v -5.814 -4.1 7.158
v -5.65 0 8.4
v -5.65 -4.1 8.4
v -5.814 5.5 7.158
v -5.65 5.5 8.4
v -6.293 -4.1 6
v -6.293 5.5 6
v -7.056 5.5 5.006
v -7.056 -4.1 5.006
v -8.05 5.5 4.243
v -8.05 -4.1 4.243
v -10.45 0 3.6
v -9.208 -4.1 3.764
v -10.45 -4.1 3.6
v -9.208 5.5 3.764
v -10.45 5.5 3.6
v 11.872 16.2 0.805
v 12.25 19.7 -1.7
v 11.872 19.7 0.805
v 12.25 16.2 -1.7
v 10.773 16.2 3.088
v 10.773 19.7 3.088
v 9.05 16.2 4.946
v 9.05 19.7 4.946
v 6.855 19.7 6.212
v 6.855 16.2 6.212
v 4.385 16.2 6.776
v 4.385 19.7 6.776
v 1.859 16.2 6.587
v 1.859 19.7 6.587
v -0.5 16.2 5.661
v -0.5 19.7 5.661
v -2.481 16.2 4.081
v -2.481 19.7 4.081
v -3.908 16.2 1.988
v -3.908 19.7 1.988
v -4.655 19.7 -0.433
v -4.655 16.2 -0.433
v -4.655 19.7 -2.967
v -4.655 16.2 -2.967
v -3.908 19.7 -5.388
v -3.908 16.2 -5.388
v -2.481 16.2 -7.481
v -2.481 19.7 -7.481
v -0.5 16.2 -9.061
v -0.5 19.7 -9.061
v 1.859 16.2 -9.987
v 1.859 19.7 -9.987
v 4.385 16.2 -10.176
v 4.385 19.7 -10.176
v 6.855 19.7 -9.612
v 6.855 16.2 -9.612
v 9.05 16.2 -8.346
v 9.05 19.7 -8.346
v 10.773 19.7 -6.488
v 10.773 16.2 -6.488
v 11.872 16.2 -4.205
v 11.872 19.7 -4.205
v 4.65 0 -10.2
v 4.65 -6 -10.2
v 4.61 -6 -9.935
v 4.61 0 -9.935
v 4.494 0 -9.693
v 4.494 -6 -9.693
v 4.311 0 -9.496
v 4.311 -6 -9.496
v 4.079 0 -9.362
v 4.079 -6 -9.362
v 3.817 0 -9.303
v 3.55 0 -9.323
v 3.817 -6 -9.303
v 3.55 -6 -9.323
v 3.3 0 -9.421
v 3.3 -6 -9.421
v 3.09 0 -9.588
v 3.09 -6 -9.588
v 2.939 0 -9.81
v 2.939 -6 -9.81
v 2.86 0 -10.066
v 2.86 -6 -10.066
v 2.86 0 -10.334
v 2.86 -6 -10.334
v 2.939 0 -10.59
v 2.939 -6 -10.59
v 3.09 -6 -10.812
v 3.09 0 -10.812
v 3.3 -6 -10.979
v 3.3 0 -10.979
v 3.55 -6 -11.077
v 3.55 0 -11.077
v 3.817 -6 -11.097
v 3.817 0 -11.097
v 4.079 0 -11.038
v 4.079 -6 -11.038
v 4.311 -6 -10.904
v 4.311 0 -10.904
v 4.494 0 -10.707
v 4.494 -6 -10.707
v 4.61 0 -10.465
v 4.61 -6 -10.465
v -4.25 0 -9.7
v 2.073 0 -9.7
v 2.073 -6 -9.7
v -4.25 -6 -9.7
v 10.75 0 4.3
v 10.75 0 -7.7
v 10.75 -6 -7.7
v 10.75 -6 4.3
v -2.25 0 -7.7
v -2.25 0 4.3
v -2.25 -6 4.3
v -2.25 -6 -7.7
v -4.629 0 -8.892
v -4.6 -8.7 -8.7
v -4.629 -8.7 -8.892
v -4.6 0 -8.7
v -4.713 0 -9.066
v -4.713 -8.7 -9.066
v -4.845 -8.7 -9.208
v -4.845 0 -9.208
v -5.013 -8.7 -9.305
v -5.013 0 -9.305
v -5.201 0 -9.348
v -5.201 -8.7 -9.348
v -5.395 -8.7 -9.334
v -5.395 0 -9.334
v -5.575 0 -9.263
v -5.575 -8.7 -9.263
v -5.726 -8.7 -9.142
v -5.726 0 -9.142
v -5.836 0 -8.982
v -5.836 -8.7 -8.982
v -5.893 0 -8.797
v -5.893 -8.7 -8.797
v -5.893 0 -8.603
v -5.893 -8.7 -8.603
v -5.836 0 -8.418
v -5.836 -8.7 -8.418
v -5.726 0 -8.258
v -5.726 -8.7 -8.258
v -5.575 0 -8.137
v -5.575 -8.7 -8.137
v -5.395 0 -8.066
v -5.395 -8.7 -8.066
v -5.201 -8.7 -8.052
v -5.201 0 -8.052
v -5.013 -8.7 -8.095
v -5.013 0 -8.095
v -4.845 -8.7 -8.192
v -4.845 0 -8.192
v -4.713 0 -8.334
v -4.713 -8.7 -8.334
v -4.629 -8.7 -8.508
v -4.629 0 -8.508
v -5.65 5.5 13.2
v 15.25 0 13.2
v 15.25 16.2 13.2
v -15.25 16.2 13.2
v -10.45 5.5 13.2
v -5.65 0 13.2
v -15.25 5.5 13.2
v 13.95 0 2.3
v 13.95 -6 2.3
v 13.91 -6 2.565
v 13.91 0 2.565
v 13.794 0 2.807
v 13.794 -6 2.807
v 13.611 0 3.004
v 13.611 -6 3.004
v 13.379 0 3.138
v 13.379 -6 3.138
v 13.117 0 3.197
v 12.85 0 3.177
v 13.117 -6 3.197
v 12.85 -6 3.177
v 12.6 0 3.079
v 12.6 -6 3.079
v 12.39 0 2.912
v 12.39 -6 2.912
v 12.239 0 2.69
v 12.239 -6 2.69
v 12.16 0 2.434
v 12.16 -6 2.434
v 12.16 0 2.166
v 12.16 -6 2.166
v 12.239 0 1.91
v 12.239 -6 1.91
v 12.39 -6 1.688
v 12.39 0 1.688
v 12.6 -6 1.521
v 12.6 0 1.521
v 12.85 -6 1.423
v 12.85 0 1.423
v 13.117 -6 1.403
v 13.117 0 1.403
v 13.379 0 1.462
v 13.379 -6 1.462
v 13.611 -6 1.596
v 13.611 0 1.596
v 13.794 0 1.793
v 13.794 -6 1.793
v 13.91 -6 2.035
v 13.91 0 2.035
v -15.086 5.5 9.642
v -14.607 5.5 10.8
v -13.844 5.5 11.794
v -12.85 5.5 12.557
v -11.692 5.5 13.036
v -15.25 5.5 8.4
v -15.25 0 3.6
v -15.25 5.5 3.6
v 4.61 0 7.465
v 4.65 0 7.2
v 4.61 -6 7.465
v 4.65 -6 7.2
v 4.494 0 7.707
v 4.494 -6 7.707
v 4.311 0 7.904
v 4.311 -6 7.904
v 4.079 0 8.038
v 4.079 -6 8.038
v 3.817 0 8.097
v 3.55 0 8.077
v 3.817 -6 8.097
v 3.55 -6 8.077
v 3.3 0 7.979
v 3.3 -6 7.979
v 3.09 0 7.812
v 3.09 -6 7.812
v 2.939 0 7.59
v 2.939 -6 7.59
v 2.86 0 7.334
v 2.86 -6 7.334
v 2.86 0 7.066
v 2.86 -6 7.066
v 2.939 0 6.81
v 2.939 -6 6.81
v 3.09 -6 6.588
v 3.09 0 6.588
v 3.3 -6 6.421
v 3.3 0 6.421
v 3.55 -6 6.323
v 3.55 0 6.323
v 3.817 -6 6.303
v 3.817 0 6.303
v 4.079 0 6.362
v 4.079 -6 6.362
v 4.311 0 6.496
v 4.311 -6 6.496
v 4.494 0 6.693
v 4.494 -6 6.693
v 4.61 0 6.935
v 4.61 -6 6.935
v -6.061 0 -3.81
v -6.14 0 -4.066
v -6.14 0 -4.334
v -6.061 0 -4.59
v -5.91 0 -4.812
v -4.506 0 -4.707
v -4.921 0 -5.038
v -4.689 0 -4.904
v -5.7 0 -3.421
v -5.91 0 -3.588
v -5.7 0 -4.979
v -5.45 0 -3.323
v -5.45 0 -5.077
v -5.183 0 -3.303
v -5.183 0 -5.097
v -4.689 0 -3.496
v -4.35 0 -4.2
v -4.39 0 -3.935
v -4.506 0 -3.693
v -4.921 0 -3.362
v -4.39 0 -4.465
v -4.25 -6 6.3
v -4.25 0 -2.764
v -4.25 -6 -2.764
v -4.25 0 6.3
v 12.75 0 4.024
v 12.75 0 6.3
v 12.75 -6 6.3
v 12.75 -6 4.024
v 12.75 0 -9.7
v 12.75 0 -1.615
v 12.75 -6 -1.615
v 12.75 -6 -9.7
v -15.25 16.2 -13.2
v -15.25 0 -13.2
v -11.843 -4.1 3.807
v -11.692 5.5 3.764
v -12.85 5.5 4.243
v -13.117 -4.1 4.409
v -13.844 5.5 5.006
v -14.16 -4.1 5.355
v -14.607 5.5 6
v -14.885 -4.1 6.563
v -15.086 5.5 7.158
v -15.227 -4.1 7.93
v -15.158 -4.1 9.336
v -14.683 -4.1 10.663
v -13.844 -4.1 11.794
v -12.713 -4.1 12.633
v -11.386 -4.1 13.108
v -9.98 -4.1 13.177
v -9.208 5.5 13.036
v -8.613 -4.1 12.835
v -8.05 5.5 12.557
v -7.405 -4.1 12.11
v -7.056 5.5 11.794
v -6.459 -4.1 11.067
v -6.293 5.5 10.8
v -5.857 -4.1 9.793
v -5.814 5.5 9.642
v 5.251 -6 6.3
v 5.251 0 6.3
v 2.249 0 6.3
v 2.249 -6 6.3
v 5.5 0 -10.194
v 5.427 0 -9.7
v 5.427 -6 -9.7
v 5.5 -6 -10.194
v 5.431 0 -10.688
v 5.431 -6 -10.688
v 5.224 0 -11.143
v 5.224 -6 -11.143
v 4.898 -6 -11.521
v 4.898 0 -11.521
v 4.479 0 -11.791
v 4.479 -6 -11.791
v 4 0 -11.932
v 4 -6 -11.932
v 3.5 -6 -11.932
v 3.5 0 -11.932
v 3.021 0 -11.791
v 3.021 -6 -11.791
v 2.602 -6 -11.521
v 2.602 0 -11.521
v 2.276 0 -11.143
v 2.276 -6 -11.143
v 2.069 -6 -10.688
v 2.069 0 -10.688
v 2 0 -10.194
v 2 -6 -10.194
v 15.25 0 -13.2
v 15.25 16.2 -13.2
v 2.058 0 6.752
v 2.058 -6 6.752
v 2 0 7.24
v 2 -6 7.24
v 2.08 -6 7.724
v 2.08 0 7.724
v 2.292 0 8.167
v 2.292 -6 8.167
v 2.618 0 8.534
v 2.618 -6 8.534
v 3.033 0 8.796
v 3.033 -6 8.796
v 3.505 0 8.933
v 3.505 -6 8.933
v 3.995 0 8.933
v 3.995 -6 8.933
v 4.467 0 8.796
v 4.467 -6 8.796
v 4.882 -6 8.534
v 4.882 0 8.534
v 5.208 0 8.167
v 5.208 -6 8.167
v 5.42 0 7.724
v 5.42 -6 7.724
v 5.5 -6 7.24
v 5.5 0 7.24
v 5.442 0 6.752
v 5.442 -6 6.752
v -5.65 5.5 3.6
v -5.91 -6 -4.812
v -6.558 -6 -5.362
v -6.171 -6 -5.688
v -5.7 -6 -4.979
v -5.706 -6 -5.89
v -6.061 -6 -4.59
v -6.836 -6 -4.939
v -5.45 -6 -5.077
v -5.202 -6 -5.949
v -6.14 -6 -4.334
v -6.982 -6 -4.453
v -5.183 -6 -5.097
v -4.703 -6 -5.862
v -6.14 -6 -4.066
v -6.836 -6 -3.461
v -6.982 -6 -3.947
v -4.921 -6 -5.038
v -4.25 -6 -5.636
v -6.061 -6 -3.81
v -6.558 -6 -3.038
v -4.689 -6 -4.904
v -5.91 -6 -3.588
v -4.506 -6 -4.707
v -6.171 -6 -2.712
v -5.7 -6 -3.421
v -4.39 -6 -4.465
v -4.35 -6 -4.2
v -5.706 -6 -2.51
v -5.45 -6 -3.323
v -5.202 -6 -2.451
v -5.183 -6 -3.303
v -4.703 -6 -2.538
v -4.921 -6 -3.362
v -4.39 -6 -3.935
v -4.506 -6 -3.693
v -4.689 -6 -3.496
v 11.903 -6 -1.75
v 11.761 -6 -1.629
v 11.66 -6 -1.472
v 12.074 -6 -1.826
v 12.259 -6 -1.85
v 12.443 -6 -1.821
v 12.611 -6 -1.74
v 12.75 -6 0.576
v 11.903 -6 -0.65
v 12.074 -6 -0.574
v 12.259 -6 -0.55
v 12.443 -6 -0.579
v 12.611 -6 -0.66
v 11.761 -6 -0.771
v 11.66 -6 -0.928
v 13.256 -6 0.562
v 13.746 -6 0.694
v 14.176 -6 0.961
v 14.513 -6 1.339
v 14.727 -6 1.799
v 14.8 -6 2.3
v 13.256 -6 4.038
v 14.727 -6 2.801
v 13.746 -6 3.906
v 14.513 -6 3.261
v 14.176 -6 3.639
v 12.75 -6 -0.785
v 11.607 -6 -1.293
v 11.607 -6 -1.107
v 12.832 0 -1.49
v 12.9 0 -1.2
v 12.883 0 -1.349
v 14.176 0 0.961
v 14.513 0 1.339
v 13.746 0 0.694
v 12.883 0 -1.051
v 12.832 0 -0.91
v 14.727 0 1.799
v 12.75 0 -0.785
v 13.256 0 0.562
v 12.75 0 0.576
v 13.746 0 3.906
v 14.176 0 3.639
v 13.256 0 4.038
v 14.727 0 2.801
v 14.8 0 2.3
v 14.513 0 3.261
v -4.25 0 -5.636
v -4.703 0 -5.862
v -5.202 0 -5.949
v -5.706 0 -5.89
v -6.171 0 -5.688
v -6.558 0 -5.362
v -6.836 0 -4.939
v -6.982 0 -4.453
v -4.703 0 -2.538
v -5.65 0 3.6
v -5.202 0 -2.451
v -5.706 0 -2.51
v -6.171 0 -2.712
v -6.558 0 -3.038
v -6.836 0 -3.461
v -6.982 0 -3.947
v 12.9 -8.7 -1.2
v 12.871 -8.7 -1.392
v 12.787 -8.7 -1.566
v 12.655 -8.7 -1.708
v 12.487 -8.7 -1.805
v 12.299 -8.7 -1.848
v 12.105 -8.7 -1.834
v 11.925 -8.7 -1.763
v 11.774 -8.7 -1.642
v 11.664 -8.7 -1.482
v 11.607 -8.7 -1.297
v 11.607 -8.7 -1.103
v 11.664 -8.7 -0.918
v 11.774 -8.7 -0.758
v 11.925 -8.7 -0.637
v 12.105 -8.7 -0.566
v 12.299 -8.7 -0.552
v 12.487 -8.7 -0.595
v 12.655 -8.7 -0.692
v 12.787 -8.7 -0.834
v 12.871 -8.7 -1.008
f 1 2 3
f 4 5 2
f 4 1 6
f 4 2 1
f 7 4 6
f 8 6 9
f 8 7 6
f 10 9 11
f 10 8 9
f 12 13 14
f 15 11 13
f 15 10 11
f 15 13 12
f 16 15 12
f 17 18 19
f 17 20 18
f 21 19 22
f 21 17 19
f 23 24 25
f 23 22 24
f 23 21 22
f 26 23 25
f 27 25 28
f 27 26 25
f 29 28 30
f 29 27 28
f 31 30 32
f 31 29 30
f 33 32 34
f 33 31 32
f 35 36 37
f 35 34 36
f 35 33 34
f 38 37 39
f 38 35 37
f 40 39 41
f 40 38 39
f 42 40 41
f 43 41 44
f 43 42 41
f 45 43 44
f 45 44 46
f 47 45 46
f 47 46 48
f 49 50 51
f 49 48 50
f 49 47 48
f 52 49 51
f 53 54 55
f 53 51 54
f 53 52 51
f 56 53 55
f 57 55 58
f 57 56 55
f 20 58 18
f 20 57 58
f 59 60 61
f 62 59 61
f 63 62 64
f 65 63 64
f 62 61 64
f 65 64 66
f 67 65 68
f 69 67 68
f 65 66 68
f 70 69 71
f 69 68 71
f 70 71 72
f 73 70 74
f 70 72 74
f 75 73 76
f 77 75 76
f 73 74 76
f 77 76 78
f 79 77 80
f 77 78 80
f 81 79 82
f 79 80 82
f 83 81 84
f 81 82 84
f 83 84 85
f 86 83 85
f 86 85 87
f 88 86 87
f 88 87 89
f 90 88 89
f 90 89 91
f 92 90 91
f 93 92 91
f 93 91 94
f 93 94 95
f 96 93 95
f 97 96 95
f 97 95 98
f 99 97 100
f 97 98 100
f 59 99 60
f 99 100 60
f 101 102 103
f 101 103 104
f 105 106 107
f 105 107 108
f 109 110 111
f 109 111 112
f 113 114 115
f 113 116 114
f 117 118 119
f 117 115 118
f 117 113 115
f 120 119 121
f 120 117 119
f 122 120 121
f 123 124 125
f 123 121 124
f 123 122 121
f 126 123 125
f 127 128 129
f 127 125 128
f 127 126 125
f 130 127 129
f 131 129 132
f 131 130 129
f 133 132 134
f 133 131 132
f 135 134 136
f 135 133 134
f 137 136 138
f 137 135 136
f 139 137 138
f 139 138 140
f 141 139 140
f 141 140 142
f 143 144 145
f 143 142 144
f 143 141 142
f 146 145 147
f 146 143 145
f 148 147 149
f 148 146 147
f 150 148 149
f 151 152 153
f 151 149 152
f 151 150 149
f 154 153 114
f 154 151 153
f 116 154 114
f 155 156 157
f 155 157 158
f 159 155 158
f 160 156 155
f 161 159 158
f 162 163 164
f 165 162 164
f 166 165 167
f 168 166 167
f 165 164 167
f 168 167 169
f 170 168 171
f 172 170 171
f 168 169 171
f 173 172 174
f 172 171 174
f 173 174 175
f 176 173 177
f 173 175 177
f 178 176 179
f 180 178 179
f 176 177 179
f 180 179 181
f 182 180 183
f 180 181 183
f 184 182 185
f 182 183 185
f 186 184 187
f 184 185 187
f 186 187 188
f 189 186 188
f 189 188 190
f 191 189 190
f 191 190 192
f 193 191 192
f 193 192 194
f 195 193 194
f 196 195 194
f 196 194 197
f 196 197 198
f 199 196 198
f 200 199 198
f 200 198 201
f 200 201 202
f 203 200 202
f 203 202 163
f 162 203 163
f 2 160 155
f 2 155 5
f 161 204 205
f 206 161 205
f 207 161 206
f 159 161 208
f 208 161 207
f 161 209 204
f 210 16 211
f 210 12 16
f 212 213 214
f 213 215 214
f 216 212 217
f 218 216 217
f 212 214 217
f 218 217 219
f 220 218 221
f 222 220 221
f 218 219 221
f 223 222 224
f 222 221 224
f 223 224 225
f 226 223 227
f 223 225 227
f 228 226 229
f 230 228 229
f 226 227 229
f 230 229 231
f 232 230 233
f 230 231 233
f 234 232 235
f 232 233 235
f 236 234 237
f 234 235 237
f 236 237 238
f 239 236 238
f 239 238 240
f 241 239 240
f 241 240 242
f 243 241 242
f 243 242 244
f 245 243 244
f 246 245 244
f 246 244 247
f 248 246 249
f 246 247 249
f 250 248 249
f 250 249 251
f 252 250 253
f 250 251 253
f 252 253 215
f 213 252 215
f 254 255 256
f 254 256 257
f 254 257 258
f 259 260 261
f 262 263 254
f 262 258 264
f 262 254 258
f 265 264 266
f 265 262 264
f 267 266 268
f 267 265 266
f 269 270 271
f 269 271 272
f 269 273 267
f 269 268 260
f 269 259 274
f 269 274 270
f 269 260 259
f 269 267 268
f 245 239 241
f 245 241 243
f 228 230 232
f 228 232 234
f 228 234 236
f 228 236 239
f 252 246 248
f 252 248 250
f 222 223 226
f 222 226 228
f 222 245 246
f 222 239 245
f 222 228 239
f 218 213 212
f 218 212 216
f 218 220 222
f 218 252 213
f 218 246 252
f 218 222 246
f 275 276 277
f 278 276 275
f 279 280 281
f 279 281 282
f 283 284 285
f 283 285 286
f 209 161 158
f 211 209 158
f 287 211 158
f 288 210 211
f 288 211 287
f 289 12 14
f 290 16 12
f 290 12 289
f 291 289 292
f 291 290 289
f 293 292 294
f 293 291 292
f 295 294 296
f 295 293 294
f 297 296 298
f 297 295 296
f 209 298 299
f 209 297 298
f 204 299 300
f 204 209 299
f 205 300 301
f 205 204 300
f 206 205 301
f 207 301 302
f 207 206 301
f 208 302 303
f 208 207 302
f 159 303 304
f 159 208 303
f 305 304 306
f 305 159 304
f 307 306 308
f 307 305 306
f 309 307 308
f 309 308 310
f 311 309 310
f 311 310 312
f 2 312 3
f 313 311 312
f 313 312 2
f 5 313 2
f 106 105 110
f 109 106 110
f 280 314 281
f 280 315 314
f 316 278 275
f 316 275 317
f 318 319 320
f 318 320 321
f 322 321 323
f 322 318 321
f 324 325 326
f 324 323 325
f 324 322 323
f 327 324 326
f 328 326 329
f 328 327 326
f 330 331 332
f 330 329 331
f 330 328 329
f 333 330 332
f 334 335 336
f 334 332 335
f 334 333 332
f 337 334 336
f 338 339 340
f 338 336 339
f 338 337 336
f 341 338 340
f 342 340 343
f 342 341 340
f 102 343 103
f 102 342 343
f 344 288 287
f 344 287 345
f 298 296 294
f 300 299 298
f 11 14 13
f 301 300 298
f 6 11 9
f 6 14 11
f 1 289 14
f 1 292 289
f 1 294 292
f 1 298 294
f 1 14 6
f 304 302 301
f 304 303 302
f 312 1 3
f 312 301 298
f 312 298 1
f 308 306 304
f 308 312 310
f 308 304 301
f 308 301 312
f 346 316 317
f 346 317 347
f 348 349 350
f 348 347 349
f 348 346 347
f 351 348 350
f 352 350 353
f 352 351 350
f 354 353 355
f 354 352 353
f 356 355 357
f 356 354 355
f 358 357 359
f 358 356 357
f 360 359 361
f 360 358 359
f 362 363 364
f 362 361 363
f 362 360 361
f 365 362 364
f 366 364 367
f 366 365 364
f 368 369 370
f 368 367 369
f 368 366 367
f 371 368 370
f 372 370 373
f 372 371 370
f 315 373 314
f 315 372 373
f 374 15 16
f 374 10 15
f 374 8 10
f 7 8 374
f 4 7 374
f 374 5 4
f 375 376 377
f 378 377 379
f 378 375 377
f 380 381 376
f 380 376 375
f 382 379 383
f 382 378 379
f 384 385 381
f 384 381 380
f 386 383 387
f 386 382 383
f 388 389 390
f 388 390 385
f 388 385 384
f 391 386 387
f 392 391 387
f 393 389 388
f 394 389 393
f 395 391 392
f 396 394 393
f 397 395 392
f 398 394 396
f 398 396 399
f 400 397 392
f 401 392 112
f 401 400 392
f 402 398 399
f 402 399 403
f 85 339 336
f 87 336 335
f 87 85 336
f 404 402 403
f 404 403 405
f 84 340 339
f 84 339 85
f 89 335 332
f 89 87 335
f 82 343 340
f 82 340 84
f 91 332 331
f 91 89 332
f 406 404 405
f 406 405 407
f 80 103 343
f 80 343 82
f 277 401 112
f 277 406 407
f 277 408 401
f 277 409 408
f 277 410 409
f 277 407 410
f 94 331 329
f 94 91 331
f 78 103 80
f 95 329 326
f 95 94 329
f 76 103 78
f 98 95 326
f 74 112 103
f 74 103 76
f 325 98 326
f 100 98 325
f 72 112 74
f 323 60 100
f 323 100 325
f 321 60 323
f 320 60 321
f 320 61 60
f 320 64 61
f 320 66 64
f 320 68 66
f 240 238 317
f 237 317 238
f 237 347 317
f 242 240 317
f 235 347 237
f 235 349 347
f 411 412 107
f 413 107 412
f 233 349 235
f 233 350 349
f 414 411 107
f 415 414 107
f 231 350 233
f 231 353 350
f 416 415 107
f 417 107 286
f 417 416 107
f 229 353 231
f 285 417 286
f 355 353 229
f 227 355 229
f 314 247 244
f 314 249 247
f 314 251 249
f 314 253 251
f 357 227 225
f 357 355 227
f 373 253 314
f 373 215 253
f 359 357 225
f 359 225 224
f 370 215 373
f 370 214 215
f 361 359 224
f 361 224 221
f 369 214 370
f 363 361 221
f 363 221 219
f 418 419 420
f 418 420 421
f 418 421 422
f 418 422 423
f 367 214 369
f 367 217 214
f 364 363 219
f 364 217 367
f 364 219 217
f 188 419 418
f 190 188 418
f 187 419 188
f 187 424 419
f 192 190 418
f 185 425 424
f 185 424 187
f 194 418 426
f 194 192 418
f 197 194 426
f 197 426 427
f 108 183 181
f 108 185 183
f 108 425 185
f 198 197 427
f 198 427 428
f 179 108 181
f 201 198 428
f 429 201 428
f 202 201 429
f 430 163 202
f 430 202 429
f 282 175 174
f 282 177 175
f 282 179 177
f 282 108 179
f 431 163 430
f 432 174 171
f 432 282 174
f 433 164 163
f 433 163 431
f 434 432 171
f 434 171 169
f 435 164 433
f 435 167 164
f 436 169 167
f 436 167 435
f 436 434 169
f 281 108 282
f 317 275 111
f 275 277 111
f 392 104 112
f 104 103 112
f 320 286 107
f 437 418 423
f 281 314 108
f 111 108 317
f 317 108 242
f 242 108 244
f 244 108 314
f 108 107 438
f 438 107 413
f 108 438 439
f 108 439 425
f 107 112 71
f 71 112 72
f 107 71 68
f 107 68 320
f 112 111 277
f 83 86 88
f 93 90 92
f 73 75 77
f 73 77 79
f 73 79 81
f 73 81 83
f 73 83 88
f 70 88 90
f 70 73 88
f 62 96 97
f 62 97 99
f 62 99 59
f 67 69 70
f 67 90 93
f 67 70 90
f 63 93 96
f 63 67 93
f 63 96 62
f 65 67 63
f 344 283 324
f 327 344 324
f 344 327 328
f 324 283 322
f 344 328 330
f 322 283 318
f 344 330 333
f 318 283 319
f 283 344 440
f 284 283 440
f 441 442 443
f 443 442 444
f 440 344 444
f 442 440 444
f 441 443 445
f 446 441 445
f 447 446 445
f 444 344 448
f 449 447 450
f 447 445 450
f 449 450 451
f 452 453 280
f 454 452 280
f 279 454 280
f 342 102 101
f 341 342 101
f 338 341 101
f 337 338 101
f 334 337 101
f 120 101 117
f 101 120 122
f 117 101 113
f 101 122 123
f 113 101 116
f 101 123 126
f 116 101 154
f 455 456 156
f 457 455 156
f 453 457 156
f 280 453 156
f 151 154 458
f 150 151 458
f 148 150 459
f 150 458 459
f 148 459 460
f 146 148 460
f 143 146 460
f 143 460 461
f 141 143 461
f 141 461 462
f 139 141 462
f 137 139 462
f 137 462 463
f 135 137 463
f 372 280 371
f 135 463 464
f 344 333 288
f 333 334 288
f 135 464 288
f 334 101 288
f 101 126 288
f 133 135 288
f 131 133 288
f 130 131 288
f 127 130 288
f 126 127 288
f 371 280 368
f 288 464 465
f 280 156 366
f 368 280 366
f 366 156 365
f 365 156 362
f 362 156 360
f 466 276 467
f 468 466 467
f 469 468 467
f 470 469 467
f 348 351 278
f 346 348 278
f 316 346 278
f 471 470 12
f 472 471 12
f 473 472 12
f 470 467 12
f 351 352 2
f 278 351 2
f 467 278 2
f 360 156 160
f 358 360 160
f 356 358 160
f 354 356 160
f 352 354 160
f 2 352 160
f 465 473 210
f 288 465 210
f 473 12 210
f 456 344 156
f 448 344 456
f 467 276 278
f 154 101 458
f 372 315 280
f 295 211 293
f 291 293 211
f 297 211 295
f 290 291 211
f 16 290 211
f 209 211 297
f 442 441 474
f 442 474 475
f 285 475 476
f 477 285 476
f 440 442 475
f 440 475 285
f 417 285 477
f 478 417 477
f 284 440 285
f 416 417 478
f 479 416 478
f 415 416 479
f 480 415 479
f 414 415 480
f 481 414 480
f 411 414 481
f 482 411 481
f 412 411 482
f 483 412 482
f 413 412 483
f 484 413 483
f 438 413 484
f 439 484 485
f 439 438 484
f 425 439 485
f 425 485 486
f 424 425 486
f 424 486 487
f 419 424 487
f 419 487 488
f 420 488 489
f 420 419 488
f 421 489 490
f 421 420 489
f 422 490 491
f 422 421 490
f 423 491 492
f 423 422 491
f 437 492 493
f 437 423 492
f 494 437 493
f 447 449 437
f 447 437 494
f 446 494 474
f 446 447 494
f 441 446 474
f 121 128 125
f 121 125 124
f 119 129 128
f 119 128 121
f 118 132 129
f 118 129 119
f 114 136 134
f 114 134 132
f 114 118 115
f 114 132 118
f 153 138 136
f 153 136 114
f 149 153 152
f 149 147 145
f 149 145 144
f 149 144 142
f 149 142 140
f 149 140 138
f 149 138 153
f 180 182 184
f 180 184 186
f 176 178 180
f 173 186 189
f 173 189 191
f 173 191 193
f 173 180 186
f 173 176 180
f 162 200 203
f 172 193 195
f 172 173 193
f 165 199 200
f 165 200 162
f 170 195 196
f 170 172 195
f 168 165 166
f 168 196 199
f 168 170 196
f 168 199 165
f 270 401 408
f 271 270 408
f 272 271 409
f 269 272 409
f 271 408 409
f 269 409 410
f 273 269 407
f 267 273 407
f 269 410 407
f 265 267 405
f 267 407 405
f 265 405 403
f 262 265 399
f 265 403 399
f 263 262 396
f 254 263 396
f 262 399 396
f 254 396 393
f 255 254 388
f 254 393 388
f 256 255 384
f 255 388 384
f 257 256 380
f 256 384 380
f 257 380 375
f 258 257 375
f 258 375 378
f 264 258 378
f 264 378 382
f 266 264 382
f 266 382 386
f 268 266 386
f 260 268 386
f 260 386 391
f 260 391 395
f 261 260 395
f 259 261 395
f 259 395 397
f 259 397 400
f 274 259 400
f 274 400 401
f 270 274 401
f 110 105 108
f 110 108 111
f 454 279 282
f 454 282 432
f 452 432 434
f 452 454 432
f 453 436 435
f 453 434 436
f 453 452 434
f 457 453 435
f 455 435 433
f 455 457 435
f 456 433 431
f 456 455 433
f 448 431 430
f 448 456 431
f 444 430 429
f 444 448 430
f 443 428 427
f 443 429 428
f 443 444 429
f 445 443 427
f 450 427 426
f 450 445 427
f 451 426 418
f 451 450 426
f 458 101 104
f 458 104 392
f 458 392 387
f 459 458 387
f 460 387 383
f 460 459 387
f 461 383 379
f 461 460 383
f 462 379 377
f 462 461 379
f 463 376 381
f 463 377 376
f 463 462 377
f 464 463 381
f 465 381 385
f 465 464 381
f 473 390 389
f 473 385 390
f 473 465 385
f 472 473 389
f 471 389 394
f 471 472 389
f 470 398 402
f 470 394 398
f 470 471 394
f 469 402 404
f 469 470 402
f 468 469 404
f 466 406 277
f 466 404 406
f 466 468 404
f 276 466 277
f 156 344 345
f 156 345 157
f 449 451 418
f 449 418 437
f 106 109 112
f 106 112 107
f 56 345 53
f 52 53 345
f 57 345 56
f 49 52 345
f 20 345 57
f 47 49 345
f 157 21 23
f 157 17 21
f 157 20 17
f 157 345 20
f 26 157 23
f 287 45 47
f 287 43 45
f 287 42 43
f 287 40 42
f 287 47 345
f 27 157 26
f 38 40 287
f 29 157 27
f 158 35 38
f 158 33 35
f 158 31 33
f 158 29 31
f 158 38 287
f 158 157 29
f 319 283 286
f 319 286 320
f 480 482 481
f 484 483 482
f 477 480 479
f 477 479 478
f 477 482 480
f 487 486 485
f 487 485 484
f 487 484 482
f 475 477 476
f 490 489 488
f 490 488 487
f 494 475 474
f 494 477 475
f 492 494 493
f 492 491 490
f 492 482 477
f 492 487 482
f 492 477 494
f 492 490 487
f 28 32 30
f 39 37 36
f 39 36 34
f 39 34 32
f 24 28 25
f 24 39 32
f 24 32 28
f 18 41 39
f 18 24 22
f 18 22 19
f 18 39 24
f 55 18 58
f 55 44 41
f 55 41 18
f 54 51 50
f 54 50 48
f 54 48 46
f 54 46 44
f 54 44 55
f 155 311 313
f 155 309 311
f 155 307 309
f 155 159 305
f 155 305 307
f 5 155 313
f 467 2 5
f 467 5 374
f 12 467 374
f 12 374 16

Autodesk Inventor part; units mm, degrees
ref_plane "YZ Plane" through (0, 0, 0) normal (1, 0, 0) x (0, 1, 0)
ref_plane "XZ Plane" through (0, 0, 0) normal (0, 1, 0) x (-1, 0, 0)
ref_plane "XY Plane" through (0, 0, 0) normal (0, 0, 1) x (1, 0, 0)
sketch "Sketch1" plane through (0, 0, 0) normal (0, 1, 0) x (-1, 0, 0)
  line L0 (-15.25, 13.2) -> (15.25, 13.2)
  line L1 (15.25, 13.2) -> (15.25, -13.2)
  line L2 (15.25, -13.2) -> (-15.25, -13.2)
  line L3 (-15.25, -13.2) -> (-15.25, 13.2)
  line L4 (-15.25, 13.2) -> (15.25, -13.2) construction
  line L5 (15.25, 13.2) -> (-15.25, -13.2) construction
  point P0 (0, 0)
  dimension "d0" = 30.5
  dimension "d1" = 26.4
extrude "Extrusion1" add sketch "Sketch1" along normal blind 16.2
sketch "Sketch2" plane through (0, 16.2, 0) normal (0, 1, 0) x (1, 0, 0)
  circle A0 centre (3.75, 1.7) radius 8.5
  line L0 (15.25, -13.2) -> (15.25, 13.2) projected
  line L1 (15.25, 13.2) -> (-15.25, 13.2) projected
  point P0 (0, 0)
  dimension "d4" = 17
  dimension "d5" = 11.5
  dimension "d6" = 11.5
extrude "Extrusion2" add sketch "Sketch2" along normal blind 3.5
sketch "Sketch3" plane through (0, 0, 0) normal (0, -1, 0) x (1, 0, 0)
  line L0 (-15.25, 13.2) -> (-15.25, -13.2) projected
  line L1 (-15.25, 13.2) -> (-5.65, 13.2)
  line L2 (-5.65, 13.2) -> (-5.65, 3.6)
  line L3 (-5.65, 3.6) -> (-15.25, 3.6)
  line L4 (-15.25, 3.6) -> (-15.25, 13.2)
  point P0 (0, 0)
  dimension "d9" = 9.6
  dimension "d10" = 9.6
extrude "Extrusion3" cut sketch "Sketch3" against normal blind 5.5
sketch "Sketch4" plane through (0, 5.5, 0) normal (0, -1, 0) x (1, 0, 0)
  line L0 (-15.25, 13.2) -> (-5.65, 13.2) projected
  line L1 (-15.25, 3.6) -> (-15.25, 13.2) projected
  line L2 (-5.65, 3.6) -> (-15.25, 3.6) projected
  line L3 (-5.65, 13.2) -> (-5.65, 3.6) projected
  circle A0 centre (-10.45, 8.4) radius 4.8
  point P0 (0, 0)
  dimension "d13" = 9.6
extrude "Extrusion4" add sketch "Sketch4" along normal blind 9.6 contours A0
sketch "Sketch5" plane through (0, 0, 0) normal (0, -1, 0) x (1, 0, 0)
  line L0 (-15.25, -13.2) -> (15.25, -13.2) projected
  line L1 (15.25, -13.2) -> (15.25, 13.2) projected
  line L2 (-2.25, -7.7) -> (10.75, -7.7)
  line L3 (10.75, -7.7) -> (10.75, 4.3)
  line L4 (10.75, 4.3) -> (-2.25, 4.3)
  line L5 (-2.25, 4.3) -> (-2.25, -7.7)
  arc A0 (12.75, 0.5759) -> (12.75, 4.0241) centre (13.05, 2.3) ccw
  arc A1 (2.0729, -9.7) -> (5.4271, -9.7) centre (3.75, -10.2) ccw
  arc A2 (5.2508, 6.3) -> (2.2492, 6.3) centre (3.75, 7.2) ccw
  arc A3 (-4.25, -2.7639) -> (-4.25, -5.6361) centre (-5.25, -4.2) ccw
  line L6 (12.75, -9.7) -> (5.4271, -9.7)
  line L7 (2.0729, -9.7) -> (-4.25, -9.7)
  line L8 (-15.25, 3.6) -> (-15.25, -13.2) projected
  line L9 (15.25, 13.2) -> (-5.65, 13.2) projected
  line L10 (-4.25, 6.3) -> (2.2492, 6.3)
  line L11 (5.2508, 6.3) -> (12.75, 6.3)
  line L12 (12.75, 6.3) -> (12.75, 4.0241)
  line L13 (12.75, 0.5759) -> (12.75, -9.7)
  line L14 (-4.25, -9.7) -> (-4.25, -5.6361)
  line L15 (-4.25, -2.7639) -> (-4.25, 6.3)
  point P0 (0, 0)
  dimension "d16" = 17
  dimension "d17" = 16
  dimension "d23" = 3.5
  dimension "d24" = 3.5
  dimension "d25" = 3.5
  dimension "d26" = 3.5
  dimension "d27" = 11.5
  dimension "d28" = 3
  dimension "d29" = 9
  dimension "d30" = 10
  dimension "d31" = 11.5
  dimension "d32" = 6
  dimension "d33" = 2.2
  dimension "d34" = 15.5
extrude "Extrusion5" add sketch "Sketch5" along normal blind 6
sketch "Sketch6" plane through (0, -6, 0) normal (0, -1, 0) x (1, 0, 0)
  line L0 (-2.25, -7.7) -> (-2.25, 4.3) projected
  line L1 (-2.25, 4.3) -> (10.75, 4.3) projected
  line L2 (10.75, 4.3) -> (10.75, -7.7) projected
  line L3 (10.75, -7.7) -> (-2.25, -7.7) projected
  line L4 (5.4271, -9.7) -> (12.75, -9.7) projected
  line L5 (12.75, -9.7) -> (12.75, 0.5759) projected
  arc A0 (12.75, 0.5759) -> (12.75, 4.0241) centre (13.05, 2.3) ccw projected
  line L6 (12.75, 4.0241) -> (12.75, 6.3) projected
  line L7 (12.75, 6.3) -> (5.2508, 6.3) projected
  arc A1 (5.2508, 6.3) -> (2.2492, 6.3) centre (3.75, 7.2) ccw projected
  line L8 (2.2492, 6.3) -> (-4.25, 6.3) projected
  line L9 (-4.25, 6.3) -> (-4.25, -2.7639) projected
  arc A2 (-4.25, -2.7639) -> (-4.25, -5.6361) centre (-5.25, -4.2) ccw projected
  line L10 (-4.25, -5.6361) -> (-4.25, -9.7) projected
  line L11 (-4.25, -9.7) -> (2.0729, -9.7) projected
  arc A3 (2.0729, -9.7) -> (5.4271, -9.7) centre (3.75, -10.2) ccw projected
  circle A4 centre (3.75, 7.2) radius 0.9
  circle A5 centre (13.05, 2.3) radius 0.9
  circle A6 centre (3.75, -10.2) radius 0.9
  circle A7 centre (-5.25, -4.2) radius 0.9
  point P0 (0, 0)
  dimension "d35" = 1.8
  dimension "d36" = 1.8
  dimension "d37" = 1.8
extrude "Extrusion6" cut sketch "Sketch6" against normal blind 6 contours A4 | A5 | A6 | A7
sketch "Sketch7" plane through (0, 0, 0) normal (0, -1, 0) x (1, 0, 0)
  circle A0 centre (-5.25, -8.7) radius 0.65
  circle A1 centre (12.25, -1.2) radius 0.65
  line L0 (-15.25, -13.2) -> (15.25, -13.2) projected
  line L1 (15.25, -13.2) -> (15.25, 13.2) projected
  point P0 (0, 0)
  dimension "d40" = 1.3
  dimension "d41" = 1.3
  dimension "d42" = 12
  dimension "d43" = 3
  dimension "d44" = 4.5
  dimension "d45" = 20.5
extrude "Extrusion7" add sketch "Sketch7" along normal blind 8.7
ref_plane "Arbeitsebene1" through (0, 0, -13.2) normal (-1, 0, 0) x (0, 0, 1)
properties part number "102_Z_Focus_CCTV_Camera"
